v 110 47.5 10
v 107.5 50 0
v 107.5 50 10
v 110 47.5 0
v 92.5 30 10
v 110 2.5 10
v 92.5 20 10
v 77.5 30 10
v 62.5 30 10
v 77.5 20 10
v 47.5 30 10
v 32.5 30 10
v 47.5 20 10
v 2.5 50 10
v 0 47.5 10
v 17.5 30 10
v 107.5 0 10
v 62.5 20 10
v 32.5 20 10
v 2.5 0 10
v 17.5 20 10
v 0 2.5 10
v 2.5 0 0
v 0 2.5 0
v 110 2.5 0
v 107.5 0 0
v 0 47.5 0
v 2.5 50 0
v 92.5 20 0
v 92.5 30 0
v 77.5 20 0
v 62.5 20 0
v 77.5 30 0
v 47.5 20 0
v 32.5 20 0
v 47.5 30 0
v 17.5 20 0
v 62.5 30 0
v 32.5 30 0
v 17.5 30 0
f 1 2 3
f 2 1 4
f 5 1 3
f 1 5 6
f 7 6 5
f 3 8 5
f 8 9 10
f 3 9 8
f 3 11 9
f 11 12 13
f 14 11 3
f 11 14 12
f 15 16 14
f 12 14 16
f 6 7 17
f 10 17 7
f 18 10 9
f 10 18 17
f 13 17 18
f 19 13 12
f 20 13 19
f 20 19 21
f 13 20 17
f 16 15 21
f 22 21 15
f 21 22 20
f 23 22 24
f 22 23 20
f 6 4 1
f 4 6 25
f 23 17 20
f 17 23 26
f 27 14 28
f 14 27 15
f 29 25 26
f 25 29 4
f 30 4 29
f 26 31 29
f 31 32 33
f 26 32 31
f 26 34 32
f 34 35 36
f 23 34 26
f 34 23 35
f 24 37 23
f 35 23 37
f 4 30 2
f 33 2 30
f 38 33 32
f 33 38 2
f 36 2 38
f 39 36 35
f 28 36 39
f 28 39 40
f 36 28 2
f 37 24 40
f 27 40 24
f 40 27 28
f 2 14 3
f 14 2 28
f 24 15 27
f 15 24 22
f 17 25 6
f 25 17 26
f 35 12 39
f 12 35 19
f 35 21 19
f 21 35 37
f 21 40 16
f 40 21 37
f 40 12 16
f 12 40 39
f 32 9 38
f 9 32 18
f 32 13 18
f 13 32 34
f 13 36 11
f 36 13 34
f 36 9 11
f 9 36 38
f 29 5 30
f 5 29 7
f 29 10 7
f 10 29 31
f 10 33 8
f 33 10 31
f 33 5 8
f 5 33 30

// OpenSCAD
$fn = 32;

// ----------------------------------------------------------------------
// Windowed plate: 3 voids, 110 x 50 x 10 mm
// ----------------------------------------------------------------------

// --- parameters (mm) ---
plate_l = 110;            // plate length, X
plate_w = 50;             // plate width, Y
plate_t = 10;             // plate thickness, Z
edge_margin = 10;         // wall from the plate edge to any window
windows = 3;              // number of windows in the row
win_l = 15;               // window length
win_w = 10;               // window width
win_pitch = 30;           // window pitch along X
depth_1 = 10;             // depth of void 1 (full thickness = through)
depth_2 = 10;             // depth of void 2 (full thickness = through)
depth_3 = 10;             // depth of void 3 (full thickness = through)
corner_c = 2.5;           // corner chamfer of the plate

profile = [[2.5, 0], [107.5, 0], [110, 2.5], [110, 47.5], [107.5, 50], [2.5, 50], [0, 47.5], [0, 2.5]];  // primary outline, 8 points, counter clockwise
void_1 = [[17.5, 20], [32.5, 20], [32.5, 30], [17.5, 30]];  // window 1 of the row, 4 points
void_2 = [[47.5, 20], [62.5, 20], [62.5, 30], [47.5, 30]];  // window 2 of the row, 4 points
void_3 = [[77.5, 20], [92.5, 20], [92.5, 30], [77.5, 30]];  // window 3 of the row, 4 points

// --- the one profile operation ---
difference() {
  linear_extrude(height = plate_t) polygon(points = profile);
  translate([0, 0, -1])
    linear_extrude(height = plate_t + 2) polygon(points = void_1);
  translate([0, 0, -1])
    linear_extrude(height = plate_t + 2) polygon(points = void_2);
  translate([0, 0, -1])
    linear_extrude(height = plate_t + 2) polygon(points = void_3);
}
